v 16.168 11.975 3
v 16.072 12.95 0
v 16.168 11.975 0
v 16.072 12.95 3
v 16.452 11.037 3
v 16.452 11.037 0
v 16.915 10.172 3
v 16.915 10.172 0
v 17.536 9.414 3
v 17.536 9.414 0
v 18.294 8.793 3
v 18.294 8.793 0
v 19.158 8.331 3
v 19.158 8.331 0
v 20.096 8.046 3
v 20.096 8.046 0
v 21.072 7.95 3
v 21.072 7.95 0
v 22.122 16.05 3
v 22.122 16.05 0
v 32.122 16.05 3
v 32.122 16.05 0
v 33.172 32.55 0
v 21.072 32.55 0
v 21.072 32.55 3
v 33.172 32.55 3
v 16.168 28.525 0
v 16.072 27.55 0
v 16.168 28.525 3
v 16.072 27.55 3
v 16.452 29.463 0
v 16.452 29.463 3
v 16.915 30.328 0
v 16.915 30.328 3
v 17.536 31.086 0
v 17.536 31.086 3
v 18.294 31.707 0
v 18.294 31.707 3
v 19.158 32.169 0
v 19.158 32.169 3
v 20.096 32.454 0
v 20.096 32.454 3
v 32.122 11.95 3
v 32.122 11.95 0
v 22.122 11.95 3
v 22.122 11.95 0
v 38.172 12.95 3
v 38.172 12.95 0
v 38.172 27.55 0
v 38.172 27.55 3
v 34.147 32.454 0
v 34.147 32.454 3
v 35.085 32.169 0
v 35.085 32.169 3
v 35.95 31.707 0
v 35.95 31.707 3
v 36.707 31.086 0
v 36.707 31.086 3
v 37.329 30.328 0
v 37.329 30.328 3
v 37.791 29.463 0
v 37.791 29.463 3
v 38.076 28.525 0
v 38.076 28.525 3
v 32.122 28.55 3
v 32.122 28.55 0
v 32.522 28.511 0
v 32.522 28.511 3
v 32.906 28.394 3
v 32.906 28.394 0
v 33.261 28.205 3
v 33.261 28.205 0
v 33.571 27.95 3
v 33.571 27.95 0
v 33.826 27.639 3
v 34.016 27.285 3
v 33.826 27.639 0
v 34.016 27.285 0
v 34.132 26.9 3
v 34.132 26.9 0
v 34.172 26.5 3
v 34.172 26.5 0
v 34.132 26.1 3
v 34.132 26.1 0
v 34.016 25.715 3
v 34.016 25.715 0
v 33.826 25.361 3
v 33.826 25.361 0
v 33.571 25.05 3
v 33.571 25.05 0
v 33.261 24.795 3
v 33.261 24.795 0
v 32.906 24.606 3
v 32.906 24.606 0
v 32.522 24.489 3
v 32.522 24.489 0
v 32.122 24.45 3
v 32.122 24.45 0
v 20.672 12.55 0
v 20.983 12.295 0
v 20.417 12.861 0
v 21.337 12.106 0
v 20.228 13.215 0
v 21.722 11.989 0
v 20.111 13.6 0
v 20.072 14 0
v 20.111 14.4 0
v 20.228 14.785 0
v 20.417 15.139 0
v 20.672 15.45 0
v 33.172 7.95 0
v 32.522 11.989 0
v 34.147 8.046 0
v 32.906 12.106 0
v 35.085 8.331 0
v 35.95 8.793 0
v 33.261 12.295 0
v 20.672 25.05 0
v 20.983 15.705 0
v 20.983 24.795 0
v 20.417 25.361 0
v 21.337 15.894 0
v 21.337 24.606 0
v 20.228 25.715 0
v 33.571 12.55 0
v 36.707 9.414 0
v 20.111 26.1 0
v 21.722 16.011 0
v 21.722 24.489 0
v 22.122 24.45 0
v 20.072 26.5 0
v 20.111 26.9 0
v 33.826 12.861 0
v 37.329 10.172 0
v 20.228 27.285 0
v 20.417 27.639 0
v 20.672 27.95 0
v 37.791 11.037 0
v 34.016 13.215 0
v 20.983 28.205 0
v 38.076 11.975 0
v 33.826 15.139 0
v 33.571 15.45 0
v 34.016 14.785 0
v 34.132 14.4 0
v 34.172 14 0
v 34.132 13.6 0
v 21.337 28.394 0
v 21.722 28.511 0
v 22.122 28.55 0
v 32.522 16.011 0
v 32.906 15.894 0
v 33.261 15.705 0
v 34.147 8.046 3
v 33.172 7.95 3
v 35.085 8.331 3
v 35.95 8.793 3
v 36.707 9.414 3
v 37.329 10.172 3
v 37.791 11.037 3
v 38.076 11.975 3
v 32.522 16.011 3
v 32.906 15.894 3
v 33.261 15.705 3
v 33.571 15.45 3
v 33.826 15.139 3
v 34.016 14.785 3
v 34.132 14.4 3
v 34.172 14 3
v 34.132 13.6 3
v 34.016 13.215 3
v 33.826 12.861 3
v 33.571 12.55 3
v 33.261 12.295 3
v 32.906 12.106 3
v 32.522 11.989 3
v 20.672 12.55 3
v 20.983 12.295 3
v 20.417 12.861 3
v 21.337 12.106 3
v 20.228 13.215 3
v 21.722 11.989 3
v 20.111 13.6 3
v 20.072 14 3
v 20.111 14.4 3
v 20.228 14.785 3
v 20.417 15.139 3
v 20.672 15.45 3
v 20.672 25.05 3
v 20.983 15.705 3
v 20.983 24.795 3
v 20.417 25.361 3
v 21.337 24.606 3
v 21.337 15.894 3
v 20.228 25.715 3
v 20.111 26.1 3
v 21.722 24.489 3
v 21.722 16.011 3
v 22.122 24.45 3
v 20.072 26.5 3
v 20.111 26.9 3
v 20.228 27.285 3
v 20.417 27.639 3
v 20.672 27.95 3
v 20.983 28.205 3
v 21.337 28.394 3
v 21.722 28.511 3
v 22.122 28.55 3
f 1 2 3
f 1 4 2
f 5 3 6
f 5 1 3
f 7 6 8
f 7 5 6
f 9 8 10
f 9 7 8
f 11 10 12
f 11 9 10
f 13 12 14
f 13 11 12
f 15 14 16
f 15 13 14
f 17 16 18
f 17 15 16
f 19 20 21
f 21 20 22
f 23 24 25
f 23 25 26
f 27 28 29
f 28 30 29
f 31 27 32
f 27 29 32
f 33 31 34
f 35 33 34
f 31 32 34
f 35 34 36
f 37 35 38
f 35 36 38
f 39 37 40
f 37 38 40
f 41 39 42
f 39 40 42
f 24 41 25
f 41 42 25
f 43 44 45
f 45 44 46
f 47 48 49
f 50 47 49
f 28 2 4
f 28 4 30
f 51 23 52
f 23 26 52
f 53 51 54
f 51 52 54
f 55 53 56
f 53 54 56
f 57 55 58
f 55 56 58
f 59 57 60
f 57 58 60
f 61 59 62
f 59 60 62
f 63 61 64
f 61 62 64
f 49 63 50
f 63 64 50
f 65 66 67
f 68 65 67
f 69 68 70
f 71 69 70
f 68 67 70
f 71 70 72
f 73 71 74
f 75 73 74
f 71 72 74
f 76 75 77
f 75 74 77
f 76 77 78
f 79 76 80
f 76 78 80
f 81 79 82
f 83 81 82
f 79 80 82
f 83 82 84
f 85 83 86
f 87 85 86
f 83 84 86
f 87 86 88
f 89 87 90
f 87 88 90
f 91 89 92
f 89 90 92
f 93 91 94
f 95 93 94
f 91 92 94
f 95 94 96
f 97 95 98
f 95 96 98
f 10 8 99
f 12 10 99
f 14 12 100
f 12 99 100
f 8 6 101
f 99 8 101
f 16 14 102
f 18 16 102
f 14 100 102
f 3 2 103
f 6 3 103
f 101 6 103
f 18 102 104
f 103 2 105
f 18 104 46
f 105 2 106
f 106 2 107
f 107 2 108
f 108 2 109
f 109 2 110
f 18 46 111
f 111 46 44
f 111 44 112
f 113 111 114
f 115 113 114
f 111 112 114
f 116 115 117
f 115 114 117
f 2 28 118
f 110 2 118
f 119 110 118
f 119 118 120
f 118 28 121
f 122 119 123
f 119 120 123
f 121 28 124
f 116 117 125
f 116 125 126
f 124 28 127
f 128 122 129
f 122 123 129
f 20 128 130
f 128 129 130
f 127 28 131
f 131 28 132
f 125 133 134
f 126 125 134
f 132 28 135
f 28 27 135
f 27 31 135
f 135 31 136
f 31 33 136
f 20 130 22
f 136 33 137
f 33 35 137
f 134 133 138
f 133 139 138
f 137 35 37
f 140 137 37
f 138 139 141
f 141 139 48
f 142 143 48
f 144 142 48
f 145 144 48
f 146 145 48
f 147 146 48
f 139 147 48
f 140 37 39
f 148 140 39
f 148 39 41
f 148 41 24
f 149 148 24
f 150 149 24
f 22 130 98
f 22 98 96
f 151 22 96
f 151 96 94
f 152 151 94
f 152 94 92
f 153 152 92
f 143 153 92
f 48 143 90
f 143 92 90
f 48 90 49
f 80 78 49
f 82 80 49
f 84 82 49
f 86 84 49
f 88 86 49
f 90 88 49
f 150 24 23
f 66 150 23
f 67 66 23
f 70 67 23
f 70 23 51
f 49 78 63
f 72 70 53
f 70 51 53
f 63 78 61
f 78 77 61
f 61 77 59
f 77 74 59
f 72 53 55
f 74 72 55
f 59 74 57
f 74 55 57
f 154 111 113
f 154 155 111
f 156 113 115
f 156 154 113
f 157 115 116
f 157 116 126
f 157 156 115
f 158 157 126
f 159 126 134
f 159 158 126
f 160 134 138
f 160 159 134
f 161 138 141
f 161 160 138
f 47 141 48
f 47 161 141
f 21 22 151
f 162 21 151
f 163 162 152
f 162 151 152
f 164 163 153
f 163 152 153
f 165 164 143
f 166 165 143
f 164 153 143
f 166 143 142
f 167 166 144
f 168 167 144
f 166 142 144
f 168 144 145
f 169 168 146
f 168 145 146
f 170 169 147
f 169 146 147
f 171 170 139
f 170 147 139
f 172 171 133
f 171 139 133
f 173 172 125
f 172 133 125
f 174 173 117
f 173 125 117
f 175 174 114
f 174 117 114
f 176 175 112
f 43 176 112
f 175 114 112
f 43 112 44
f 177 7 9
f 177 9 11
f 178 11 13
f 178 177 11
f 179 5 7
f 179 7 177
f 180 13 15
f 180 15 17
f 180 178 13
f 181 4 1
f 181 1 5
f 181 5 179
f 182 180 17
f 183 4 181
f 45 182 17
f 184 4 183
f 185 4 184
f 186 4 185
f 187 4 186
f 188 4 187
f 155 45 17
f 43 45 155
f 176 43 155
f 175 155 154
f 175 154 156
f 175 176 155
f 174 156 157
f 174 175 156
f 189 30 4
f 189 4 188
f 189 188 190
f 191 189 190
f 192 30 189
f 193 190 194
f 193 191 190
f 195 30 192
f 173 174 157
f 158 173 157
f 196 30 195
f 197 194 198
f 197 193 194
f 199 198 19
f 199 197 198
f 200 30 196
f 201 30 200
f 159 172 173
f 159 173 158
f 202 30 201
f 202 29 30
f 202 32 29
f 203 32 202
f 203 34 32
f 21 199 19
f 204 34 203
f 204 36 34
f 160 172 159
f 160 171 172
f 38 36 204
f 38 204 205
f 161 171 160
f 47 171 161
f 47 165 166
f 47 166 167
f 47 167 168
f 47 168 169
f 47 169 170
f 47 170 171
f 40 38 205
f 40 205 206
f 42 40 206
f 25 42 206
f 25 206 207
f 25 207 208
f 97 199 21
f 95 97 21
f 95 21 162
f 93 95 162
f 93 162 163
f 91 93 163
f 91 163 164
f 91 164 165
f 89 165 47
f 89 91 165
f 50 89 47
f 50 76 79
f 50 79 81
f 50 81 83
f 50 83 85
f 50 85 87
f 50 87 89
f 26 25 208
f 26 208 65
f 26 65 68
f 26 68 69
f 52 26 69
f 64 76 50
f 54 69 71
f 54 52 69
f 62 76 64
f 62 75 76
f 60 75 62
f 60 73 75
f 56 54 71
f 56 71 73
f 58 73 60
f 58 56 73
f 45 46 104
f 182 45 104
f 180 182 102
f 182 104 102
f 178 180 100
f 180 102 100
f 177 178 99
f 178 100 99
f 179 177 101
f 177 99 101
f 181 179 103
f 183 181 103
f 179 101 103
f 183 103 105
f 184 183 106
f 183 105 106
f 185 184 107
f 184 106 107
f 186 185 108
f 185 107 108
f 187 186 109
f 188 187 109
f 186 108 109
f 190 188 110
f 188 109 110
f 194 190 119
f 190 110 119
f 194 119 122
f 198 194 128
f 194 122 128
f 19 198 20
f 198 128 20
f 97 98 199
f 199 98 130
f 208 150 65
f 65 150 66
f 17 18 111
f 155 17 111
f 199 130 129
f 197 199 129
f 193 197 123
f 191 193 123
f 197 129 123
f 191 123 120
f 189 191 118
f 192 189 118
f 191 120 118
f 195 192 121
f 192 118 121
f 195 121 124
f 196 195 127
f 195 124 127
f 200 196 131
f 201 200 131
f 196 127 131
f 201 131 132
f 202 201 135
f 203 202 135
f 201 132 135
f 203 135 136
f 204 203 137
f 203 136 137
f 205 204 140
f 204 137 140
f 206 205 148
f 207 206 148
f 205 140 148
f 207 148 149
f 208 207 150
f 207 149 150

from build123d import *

# Parameters (mm, degrees)
ESBO_O1_W                = 22.1
ESBO_O1_H                = 24.6
RESSALTO_EXTRUS_O1_DEPTH = 3
FILETE1_R                = 5


with BuildPart() as part:
    # Esboço1 → Ressalto-extrusão1 (new body)
    with BuildSketch(Plane.XY):
        with Locations((27.12188209, 20.25)):
            Rectangle(ESBO_O1_W, ESBO_O1_H)
        with BuildLine():
            Line((22.12188209, 28.55), (32.12188209, 28.55))
            ThreePointArc((32.12188209, 28.55), (34.17188209, 26.5), (32.12188209, 24.45))
            Line((32.12188209, 24.45), (22.12188209, 24.45))
            ThreePointArc((22.12188209, 24.45), (20.07188209, 26.5), (22.12188209, 28.55))
        make_face(mode=Mode.SUBTRACT)
        with BuildLine():
            Line((22.12188209, 16.05), (32.12188209, 16.05))
            ThreePointArc((32.12188209, 16.05), (34.17188209, 14), (32.12188209, 11.95))
            Line((32.12188209, 11.95), (22.12188209, 11.95))
            ThreePointArc((22.12188209, 11.95), (20.07188209, 14), (22.12188209, 16.05))
        make_face(mode=Mode.SUBTRACT)
    extrude(amount=RESSALTO_EXTRUS_O1_DEPTH)

    # Filete1
    filete1_edges = [part.edges().sort_by_distance(p)[0] for p in [
        (16.07188209, 32.55, 1.5),
        (38.17188209, 32.55, 1.5),
        (38.17188209, 7.95, 1.5),
        (16.07188209, 7.95, 1.5),
    ]]
    fillet(filete1_edges, radius=FILETE1_R)


solid = part.part
